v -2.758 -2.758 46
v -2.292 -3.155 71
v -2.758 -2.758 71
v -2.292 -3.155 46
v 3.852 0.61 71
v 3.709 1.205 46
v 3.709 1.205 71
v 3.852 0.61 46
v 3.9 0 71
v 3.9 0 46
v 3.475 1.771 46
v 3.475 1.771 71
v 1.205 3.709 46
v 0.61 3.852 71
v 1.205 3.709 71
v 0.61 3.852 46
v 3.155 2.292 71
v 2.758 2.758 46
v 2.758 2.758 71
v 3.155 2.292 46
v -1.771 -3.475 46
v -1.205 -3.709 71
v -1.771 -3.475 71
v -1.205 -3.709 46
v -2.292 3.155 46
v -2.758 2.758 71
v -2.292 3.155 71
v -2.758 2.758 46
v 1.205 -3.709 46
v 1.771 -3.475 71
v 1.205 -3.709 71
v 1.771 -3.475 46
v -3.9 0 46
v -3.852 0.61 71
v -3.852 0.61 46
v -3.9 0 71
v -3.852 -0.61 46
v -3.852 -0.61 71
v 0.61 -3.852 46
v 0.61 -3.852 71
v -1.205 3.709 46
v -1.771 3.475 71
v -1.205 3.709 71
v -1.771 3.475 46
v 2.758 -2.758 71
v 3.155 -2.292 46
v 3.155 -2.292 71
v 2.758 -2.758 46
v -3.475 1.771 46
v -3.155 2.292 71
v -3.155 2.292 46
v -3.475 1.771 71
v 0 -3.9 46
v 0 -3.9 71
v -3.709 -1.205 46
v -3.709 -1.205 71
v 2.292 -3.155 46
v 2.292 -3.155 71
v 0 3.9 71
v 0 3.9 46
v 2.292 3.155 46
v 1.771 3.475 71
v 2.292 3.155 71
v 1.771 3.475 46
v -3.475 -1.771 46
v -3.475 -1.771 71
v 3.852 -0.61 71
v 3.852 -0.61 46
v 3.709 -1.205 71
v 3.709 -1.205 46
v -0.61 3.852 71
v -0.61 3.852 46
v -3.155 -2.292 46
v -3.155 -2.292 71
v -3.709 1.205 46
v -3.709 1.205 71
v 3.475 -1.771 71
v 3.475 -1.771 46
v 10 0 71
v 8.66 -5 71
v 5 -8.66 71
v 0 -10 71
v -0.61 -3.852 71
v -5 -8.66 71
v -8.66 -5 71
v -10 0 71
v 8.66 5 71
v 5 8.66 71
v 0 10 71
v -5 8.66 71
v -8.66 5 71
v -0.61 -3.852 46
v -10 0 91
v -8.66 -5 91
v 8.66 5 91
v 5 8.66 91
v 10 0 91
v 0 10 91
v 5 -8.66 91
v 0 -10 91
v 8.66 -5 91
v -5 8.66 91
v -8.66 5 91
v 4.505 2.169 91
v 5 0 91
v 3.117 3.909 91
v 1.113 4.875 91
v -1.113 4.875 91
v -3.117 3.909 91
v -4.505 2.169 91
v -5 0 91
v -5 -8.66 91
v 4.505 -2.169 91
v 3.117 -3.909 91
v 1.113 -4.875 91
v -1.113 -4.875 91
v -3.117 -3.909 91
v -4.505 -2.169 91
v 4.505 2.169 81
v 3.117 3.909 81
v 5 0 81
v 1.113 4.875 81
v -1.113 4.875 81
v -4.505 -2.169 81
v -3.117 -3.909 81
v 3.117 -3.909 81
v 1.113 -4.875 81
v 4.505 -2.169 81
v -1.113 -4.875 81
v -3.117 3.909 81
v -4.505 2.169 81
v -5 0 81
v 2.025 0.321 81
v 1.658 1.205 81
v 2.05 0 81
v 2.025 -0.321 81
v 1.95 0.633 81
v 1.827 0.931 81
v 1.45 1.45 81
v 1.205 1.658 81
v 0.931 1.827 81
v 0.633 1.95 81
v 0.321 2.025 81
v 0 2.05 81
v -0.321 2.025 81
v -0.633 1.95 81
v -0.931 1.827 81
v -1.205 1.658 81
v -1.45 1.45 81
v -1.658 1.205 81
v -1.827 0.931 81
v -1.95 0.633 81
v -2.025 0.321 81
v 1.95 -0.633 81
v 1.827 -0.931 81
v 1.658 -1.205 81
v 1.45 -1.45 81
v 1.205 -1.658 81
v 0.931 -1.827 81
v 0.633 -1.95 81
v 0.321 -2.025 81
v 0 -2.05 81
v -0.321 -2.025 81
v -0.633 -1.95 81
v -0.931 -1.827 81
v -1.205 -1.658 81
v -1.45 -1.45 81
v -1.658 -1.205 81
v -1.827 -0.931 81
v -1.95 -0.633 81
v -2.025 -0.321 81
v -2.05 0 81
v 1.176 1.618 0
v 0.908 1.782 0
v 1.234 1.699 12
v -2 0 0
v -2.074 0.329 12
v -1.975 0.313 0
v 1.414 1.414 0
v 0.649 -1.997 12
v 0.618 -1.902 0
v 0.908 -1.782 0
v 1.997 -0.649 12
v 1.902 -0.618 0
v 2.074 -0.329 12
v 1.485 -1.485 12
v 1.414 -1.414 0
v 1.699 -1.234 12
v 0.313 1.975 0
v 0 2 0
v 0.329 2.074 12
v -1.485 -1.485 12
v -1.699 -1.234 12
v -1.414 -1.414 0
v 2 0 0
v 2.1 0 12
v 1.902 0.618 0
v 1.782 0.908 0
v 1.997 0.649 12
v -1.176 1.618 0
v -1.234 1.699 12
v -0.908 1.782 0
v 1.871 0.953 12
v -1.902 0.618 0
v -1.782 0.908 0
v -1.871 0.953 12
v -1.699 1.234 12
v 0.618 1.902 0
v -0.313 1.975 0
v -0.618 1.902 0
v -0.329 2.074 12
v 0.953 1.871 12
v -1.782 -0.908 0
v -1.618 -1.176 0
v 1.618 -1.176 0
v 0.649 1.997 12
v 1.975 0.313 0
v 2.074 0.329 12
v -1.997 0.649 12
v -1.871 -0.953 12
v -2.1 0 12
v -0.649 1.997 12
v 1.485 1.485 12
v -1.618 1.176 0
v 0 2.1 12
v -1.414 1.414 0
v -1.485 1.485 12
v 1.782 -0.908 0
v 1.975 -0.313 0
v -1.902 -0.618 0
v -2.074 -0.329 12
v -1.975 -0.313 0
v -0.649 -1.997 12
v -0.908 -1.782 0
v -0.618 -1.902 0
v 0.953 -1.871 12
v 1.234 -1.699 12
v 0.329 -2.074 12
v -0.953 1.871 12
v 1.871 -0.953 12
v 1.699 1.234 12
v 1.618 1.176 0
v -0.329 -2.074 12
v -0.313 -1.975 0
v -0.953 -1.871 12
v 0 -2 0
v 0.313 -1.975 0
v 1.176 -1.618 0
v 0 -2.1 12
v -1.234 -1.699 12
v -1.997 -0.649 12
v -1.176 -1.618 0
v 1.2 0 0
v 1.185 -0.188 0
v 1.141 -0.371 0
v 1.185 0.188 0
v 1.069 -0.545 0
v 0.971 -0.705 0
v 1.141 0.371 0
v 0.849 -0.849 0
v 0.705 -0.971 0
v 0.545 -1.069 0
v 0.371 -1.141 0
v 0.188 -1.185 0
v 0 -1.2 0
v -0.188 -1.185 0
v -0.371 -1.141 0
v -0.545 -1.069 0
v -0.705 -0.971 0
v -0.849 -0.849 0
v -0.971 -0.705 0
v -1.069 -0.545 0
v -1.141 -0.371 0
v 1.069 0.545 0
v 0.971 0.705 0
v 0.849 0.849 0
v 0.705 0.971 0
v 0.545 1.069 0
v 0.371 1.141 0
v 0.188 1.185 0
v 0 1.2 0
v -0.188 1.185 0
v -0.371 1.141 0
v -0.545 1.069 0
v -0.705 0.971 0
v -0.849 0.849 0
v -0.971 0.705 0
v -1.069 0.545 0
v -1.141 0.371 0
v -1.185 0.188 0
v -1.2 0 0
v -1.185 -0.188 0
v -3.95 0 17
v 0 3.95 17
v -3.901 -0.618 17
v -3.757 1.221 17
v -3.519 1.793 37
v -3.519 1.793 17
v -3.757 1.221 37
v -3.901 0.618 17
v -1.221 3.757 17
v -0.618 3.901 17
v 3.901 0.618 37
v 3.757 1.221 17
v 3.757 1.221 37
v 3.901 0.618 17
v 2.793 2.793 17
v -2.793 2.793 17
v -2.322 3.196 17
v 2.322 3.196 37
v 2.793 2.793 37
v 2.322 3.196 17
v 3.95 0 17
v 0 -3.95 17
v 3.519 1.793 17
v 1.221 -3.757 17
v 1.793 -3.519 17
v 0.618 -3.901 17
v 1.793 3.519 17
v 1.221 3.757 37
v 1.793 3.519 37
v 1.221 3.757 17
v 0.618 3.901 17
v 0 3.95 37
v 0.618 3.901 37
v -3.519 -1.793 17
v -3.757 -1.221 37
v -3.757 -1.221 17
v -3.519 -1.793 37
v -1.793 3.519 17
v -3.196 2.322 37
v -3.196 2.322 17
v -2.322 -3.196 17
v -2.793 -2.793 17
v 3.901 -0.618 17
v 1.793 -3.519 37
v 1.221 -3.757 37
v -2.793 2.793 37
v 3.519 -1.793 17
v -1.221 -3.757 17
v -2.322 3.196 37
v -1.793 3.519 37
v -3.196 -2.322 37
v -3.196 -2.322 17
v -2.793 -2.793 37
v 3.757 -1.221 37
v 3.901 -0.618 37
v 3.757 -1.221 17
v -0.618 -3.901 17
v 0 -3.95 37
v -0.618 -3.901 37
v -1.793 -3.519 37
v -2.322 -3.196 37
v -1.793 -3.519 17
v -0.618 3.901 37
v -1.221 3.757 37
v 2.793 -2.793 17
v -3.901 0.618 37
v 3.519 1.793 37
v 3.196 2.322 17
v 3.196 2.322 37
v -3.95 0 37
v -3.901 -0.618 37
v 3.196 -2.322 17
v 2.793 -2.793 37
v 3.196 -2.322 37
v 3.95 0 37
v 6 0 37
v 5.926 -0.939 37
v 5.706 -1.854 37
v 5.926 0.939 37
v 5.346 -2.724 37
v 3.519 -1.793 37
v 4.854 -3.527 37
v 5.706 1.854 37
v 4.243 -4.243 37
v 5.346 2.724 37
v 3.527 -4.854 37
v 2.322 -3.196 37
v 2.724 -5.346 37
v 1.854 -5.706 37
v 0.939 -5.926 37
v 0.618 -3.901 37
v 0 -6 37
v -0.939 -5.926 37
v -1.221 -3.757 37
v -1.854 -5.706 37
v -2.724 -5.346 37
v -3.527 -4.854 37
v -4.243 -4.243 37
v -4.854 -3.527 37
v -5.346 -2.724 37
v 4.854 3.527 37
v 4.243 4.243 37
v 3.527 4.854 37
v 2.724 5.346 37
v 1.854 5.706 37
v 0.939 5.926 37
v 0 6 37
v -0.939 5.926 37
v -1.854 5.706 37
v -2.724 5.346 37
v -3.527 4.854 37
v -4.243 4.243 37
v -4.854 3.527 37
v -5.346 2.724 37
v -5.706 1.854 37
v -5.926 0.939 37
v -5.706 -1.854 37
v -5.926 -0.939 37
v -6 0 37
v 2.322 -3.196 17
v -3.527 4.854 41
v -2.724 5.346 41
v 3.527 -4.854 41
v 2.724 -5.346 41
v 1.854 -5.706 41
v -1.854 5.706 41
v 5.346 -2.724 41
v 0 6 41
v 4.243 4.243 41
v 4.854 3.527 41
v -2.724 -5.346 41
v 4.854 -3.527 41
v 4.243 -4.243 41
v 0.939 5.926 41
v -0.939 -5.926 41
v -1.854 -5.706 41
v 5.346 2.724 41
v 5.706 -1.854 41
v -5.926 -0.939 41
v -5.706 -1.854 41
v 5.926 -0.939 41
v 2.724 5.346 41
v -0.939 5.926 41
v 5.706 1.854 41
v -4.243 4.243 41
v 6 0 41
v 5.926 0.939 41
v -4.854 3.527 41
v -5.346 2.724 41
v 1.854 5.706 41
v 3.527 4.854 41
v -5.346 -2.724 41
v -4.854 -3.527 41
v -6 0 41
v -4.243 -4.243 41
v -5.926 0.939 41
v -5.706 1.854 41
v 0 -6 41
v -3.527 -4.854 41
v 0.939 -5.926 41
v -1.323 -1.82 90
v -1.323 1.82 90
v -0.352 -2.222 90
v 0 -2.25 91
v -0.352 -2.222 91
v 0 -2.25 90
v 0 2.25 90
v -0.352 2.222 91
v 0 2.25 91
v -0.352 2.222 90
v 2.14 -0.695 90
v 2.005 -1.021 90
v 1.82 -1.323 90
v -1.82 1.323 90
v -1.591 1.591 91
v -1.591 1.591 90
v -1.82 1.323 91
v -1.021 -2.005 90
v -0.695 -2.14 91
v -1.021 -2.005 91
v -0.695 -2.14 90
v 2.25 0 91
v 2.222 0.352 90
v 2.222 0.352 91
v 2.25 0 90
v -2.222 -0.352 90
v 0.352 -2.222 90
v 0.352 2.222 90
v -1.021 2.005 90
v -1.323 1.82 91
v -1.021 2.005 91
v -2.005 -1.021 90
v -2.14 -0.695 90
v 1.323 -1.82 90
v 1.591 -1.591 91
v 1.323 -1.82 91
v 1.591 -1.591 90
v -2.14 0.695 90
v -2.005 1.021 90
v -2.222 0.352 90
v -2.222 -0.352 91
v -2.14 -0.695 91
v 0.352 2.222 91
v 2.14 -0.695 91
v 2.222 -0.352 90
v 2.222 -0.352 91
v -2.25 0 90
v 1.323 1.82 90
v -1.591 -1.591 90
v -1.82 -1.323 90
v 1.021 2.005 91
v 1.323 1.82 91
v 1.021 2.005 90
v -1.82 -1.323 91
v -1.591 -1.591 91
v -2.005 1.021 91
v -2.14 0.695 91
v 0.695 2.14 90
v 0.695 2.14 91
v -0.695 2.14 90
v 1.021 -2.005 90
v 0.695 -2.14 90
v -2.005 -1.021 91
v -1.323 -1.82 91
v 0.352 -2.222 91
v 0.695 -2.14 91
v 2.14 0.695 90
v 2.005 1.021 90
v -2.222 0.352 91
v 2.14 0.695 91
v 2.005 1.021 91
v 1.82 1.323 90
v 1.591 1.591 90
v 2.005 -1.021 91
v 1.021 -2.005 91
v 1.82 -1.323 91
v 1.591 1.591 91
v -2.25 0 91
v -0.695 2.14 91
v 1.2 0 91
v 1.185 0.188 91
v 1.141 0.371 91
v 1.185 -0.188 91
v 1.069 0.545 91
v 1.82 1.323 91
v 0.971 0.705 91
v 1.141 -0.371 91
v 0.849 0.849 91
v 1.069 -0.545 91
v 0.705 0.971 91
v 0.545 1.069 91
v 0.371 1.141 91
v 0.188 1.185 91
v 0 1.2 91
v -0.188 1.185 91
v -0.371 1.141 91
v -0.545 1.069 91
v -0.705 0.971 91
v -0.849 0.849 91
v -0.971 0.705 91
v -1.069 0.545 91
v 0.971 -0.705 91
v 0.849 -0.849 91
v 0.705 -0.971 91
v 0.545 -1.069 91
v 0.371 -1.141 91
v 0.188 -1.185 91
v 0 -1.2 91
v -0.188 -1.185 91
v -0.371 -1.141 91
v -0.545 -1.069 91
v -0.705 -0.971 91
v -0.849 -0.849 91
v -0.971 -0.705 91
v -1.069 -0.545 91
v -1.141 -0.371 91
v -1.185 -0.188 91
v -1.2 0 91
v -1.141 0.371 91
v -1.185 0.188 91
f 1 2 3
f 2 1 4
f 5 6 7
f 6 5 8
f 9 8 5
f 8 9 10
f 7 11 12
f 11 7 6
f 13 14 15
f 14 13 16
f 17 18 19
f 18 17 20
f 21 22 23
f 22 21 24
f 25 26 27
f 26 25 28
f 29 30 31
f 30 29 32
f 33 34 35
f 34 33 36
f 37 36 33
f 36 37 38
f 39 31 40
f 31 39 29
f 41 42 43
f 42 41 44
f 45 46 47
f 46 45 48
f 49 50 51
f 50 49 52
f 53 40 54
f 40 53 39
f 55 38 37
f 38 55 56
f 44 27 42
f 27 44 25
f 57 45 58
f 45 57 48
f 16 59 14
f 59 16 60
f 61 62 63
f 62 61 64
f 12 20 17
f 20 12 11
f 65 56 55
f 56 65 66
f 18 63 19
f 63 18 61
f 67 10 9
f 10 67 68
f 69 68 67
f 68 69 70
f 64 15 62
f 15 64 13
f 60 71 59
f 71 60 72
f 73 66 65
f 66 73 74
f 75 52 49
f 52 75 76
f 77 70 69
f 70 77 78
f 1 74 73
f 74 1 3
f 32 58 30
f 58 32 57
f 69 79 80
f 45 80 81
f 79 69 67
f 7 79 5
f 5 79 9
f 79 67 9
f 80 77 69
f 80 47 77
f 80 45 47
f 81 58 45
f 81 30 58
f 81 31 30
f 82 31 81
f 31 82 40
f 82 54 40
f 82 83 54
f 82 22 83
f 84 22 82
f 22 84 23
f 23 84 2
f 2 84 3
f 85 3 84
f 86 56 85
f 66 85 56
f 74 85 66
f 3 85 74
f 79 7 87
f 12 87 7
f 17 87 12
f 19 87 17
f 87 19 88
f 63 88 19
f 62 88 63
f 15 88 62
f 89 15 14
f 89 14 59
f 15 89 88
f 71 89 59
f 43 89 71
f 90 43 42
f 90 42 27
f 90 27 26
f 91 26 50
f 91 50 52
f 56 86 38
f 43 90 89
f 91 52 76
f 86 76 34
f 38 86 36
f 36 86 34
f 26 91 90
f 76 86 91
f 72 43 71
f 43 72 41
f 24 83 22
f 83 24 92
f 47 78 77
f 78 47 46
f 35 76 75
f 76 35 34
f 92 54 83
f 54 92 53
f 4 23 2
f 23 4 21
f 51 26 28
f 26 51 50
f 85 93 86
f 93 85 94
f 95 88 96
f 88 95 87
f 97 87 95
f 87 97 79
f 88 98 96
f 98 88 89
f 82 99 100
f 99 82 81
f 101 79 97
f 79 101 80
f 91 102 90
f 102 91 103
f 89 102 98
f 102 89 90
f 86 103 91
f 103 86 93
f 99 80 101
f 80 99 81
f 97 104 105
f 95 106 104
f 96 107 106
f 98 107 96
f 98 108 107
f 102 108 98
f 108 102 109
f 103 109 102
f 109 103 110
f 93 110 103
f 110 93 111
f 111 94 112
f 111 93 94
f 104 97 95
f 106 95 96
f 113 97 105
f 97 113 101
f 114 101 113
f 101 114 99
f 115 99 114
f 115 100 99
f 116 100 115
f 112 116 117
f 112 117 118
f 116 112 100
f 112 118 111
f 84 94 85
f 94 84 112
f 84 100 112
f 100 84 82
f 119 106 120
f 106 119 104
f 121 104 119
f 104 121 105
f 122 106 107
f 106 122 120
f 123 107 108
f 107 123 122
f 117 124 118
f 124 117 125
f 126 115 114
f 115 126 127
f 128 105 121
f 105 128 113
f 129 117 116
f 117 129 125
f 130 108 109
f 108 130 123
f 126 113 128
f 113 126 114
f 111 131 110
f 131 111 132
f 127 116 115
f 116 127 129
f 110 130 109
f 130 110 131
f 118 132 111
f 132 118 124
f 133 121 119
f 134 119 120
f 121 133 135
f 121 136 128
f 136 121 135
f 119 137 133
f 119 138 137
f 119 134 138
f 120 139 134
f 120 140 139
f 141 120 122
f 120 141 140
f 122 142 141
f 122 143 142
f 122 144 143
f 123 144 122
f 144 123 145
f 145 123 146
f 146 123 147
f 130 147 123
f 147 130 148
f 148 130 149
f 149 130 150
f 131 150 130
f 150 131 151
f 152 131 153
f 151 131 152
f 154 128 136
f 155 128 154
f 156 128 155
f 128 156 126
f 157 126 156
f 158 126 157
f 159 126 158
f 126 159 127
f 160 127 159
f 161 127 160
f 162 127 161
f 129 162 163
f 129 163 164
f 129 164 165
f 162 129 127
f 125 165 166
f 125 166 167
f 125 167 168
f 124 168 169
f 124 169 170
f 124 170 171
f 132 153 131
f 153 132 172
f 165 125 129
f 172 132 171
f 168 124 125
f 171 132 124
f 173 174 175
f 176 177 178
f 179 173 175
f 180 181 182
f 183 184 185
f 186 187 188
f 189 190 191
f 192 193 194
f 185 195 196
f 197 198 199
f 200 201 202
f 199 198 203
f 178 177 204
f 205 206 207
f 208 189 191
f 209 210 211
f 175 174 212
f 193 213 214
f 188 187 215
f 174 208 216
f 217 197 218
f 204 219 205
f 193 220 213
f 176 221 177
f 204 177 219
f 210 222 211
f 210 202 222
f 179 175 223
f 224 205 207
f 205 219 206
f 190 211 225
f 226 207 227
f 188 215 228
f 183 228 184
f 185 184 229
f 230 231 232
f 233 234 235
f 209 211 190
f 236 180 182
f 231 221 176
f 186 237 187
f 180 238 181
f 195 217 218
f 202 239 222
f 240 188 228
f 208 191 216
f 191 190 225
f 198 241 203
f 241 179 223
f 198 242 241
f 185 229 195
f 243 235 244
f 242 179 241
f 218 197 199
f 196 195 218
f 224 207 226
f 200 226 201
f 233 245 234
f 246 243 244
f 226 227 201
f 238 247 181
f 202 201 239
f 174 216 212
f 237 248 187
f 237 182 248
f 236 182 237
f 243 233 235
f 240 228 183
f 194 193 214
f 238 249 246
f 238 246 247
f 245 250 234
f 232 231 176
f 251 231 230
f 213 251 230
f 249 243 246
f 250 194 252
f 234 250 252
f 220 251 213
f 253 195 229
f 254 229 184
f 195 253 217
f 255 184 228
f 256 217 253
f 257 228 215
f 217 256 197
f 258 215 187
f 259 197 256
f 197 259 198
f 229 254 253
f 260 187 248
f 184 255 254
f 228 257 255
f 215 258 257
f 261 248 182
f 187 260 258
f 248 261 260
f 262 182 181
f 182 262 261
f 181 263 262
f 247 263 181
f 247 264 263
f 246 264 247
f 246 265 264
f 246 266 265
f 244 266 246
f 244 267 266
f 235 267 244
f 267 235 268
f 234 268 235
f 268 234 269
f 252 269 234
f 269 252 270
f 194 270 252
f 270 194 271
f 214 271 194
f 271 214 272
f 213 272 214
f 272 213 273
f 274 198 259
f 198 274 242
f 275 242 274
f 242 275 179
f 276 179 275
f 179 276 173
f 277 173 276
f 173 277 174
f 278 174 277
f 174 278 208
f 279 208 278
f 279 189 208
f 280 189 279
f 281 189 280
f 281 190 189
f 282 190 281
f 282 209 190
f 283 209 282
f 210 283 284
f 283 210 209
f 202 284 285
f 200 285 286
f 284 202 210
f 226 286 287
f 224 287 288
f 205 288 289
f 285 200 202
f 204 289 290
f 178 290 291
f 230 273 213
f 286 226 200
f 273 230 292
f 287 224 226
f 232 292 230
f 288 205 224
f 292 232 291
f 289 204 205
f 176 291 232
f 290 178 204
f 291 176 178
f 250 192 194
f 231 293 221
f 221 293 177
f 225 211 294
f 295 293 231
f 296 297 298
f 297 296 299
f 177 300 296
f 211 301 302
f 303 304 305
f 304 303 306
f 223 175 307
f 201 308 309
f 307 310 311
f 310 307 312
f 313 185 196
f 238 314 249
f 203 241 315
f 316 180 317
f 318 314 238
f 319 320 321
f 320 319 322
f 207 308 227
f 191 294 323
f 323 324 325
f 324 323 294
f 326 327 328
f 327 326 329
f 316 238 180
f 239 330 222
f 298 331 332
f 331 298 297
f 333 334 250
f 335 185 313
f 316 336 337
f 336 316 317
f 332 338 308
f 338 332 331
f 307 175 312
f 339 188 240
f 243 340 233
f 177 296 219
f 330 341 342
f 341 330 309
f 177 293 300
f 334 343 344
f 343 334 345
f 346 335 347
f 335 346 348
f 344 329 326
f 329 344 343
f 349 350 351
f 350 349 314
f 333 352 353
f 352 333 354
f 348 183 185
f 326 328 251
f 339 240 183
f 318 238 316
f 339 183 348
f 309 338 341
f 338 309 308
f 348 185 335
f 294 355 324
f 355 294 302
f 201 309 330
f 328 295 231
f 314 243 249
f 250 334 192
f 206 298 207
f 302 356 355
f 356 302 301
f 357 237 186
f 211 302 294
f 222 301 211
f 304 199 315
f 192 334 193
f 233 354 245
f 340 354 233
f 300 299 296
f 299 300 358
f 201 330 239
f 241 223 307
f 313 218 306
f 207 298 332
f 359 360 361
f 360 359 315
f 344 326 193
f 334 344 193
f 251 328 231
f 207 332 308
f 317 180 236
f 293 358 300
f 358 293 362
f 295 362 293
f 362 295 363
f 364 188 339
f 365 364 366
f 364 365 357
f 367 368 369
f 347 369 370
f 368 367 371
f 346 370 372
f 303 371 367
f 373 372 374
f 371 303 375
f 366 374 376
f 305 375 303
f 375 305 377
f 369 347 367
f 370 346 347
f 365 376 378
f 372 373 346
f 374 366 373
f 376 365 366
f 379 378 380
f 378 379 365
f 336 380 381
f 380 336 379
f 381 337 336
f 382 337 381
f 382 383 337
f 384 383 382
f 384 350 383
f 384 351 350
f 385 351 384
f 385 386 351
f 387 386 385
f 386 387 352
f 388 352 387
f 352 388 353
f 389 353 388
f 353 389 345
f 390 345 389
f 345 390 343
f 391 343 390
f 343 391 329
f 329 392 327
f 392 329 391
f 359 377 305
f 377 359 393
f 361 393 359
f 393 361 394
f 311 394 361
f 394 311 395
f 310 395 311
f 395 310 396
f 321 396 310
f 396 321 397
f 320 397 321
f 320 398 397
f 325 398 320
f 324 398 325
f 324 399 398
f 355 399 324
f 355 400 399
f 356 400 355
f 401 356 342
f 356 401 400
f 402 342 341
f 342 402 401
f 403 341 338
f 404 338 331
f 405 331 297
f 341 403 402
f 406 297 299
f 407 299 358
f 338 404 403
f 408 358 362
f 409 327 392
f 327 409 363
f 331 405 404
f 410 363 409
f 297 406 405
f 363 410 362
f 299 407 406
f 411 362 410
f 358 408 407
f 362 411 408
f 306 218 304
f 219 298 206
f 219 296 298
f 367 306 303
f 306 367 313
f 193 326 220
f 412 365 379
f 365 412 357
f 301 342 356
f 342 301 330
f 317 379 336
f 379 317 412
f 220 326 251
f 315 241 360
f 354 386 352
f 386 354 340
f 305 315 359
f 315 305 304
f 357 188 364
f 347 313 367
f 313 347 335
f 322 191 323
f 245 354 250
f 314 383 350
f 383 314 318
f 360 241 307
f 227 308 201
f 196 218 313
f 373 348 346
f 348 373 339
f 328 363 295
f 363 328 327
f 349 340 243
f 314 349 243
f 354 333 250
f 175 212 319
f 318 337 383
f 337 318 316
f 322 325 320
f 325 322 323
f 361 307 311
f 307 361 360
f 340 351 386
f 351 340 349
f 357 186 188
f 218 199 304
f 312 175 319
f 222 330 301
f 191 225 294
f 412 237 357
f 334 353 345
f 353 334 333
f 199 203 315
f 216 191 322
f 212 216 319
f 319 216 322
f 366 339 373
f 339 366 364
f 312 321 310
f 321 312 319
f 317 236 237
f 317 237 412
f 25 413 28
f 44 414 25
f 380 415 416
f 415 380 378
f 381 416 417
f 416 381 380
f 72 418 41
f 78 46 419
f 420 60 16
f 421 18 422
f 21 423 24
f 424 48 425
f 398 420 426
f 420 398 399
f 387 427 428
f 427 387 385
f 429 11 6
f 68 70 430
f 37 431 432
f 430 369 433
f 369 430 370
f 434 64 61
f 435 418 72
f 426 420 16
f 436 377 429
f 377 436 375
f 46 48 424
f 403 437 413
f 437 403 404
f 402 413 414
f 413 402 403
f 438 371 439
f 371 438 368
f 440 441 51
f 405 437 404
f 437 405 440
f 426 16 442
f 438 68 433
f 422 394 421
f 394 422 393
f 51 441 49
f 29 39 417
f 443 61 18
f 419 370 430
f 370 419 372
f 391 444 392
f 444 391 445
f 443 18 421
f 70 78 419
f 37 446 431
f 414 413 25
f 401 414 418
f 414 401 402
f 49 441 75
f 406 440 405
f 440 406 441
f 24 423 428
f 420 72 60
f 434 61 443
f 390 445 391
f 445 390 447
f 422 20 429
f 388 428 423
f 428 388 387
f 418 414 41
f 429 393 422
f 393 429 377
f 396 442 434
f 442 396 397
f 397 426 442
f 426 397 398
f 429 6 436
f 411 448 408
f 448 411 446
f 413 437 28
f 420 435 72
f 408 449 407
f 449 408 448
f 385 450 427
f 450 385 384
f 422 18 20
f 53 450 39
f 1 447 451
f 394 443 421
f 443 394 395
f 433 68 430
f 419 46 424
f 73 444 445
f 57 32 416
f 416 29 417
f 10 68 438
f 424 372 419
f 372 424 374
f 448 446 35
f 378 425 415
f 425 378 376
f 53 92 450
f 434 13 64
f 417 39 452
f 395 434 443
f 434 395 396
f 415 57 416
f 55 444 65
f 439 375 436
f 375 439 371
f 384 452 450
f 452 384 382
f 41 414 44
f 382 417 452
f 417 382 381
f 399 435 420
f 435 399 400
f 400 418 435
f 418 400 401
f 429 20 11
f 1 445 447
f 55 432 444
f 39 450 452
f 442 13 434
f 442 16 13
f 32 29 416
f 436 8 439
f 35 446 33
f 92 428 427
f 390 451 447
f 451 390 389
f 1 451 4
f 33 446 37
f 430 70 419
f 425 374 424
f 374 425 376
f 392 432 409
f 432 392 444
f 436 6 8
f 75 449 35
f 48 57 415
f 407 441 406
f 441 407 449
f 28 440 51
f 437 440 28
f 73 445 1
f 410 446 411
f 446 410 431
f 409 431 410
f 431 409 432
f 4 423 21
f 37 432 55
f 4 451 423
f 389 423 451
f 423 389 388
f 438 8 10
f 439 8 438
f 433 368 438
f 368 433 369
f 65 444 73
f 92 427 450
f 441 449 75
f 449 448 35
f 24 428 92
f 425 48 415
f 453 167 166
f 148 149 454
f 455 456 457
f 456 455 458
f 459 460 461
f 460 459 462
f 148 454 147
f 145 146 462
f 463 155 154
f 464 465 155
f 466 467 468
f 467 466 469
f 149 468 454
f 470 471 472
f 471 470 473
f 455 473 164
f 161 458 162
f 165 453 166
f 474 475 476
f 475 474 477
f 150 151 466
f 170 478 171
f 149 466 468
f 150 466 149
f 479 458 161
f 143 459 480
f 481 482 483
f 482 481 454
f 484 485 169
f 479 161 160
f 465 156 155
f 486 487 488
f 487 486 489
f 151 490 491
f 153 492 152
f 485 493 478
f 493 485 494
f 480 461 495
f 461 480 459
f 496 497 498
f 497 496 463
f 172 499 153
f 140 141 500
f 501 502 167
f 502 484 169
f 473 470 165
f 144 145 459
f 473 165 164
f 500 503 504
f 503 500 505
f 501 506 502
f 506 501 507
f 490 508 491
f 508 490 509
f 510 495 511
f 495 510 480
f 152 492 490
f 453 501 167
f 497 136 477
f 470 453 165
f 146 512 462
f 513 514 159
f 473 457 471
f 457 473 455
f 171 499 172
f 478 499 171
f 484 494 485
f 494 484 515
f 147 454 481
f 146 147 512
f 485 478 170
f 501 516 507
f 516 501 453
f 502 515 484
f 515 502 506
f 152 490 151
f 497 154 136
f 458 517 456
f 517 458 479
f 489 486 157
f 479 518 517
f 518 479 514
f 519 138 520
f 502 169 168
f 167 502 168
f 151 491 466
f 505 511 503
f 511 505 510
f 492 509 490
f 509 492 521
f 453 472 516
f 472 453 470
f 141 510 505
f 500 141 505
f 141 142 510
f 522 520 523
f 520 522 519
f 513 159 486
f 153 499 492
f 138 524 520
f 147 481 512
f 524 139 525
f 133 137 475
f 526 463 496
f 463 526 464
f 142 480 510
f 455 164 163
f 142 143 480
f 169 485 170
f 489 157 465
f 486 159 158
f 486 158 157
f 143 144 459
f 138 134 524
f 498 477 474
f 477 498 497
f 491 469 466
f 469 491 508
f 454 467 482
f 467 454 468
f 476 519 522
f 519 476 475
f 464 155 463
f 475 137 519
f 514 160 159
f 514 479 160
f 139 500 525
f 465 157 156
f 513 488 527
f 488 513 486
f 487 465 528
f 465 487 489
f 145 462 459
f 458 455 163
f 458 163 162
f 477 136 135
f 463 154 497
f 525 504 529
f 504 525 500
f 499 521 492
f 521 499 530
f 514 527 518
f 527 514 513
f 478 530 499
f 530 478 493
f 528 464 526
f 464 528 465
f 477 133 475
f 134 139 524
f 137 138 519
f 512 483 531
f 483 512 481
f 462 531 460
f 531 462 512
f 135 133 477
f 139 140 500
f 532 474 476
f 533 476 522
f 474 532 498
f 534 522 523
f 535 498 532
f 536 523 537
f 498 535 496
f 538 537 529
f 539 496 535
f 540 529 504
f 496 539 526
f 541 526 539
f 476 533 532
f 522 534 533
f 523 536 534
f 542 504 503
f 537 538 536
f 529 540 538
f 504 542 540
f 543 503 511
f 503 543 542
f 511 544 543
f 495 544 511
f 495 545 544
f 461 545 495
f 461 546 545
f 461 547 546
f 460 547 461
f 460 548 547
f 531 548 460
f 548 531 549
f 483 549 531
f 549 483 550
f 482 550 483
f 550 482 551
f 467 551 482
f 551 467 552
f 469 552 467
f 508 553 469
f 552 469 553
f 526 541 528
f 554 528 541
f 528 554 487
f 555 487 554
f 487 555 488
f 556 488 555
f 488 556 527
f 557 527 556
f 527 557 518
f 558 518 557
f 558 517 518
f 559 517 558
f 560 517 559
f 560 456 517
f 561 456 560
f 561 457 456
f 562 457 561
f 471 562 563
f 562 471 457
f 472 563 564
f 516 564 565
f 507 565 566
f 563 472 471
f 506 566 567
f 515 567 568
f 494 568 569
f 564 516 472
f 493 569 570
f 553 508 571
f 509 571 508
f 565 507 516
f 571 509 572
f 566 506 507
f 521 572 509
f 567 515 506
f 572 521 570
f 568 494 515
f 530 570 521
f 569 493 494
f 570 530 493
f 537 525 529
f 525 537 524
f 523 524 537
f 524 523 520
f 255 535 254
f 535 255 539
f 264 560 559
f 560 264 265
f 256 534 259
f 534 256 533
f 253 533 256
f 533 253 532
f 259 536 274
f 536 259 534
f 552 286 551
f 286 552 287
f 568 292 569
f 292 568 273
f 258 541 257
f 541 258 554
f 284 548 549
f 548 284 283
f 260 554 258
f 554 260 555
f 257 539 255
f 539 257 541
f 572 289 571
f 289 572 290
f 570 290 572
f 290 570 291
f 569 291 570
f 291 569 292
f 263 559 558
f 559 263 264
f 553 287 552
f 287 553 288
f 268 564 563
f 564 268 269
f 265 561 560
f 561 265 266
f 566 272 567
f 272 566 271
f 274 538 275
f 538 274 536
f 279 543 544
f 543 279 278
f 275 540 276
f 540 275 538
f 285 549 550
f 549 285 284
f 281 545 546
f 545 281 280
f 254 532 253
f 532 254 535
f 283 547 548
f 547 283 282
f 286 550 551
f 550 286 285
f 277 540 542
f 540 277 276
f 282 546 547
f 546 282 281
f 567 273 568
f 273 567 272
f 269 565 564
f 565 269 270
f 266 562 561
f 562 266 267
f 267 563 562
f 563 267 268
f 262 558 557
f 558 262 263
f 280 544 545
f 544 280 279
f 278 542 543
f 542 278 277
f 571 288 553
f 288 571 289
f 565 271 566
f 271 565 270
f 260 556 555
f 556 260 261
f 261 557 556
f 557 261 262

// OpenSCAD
BEARING_INTERNAL_DIAMETER = 7.8;

module tip() {

    $fn = 40;
    clear = 0.05;

    difference() {
        union() {
            hull() {
                cylinder(r = 4.0 / 2, h = 1);
                translate([0, 0, 12]) {
                    cylinder(r = 4.2 / 2, h = 1);
                }
            }

            hull() {
                translate([0, 0, 12]) {
                    cylinder(r = 4.2 / 2, h = 1);
                }

                translate([0, 0, 17]) {
                    cylinder(r = BEARING_INTERNAL_DIAMETER / 2 + clear, h = 20);
                }
            }

            hull() {
                translate([0, 0, 37]) {
                    cylinder(r = 12 / 2, h = 4);
                }

                translate([0, 0, 41]) {
                    cylinder(r = BEARING_INTERNAL_DIAMETER / 2, h = 5);
                }
            }

            difference() {
                union() {
                    translate([0, 0, 46]) {
                        cylinder(r = BEARING_INTERNAL_DIAMETER / 2, h = 25);
                    }

                    translate([0, 0, 71]) {
                        cylinder(r = 20 / 2, h = 20, $fn = 12);
                    }
                }

                translate([0, 0, 81]) {
                    cylinder(r = 5, h = 11, $fn = 14);
                }               
            }

            translate([0, 0, 81]) {
                hull() {
                    cylinder(r = 4.1 / 2, h = 1);
                    translate([0, 0, 9]) {
                        cylinder(r = 4.5 / 2, h = 1);
                    }
                }
            }
        }

        cylinder(r = 1.2, h = 1000);
    }
}

intersection() {
    !tip();
    cube(size = [10, 10, 60], center = true);
}
